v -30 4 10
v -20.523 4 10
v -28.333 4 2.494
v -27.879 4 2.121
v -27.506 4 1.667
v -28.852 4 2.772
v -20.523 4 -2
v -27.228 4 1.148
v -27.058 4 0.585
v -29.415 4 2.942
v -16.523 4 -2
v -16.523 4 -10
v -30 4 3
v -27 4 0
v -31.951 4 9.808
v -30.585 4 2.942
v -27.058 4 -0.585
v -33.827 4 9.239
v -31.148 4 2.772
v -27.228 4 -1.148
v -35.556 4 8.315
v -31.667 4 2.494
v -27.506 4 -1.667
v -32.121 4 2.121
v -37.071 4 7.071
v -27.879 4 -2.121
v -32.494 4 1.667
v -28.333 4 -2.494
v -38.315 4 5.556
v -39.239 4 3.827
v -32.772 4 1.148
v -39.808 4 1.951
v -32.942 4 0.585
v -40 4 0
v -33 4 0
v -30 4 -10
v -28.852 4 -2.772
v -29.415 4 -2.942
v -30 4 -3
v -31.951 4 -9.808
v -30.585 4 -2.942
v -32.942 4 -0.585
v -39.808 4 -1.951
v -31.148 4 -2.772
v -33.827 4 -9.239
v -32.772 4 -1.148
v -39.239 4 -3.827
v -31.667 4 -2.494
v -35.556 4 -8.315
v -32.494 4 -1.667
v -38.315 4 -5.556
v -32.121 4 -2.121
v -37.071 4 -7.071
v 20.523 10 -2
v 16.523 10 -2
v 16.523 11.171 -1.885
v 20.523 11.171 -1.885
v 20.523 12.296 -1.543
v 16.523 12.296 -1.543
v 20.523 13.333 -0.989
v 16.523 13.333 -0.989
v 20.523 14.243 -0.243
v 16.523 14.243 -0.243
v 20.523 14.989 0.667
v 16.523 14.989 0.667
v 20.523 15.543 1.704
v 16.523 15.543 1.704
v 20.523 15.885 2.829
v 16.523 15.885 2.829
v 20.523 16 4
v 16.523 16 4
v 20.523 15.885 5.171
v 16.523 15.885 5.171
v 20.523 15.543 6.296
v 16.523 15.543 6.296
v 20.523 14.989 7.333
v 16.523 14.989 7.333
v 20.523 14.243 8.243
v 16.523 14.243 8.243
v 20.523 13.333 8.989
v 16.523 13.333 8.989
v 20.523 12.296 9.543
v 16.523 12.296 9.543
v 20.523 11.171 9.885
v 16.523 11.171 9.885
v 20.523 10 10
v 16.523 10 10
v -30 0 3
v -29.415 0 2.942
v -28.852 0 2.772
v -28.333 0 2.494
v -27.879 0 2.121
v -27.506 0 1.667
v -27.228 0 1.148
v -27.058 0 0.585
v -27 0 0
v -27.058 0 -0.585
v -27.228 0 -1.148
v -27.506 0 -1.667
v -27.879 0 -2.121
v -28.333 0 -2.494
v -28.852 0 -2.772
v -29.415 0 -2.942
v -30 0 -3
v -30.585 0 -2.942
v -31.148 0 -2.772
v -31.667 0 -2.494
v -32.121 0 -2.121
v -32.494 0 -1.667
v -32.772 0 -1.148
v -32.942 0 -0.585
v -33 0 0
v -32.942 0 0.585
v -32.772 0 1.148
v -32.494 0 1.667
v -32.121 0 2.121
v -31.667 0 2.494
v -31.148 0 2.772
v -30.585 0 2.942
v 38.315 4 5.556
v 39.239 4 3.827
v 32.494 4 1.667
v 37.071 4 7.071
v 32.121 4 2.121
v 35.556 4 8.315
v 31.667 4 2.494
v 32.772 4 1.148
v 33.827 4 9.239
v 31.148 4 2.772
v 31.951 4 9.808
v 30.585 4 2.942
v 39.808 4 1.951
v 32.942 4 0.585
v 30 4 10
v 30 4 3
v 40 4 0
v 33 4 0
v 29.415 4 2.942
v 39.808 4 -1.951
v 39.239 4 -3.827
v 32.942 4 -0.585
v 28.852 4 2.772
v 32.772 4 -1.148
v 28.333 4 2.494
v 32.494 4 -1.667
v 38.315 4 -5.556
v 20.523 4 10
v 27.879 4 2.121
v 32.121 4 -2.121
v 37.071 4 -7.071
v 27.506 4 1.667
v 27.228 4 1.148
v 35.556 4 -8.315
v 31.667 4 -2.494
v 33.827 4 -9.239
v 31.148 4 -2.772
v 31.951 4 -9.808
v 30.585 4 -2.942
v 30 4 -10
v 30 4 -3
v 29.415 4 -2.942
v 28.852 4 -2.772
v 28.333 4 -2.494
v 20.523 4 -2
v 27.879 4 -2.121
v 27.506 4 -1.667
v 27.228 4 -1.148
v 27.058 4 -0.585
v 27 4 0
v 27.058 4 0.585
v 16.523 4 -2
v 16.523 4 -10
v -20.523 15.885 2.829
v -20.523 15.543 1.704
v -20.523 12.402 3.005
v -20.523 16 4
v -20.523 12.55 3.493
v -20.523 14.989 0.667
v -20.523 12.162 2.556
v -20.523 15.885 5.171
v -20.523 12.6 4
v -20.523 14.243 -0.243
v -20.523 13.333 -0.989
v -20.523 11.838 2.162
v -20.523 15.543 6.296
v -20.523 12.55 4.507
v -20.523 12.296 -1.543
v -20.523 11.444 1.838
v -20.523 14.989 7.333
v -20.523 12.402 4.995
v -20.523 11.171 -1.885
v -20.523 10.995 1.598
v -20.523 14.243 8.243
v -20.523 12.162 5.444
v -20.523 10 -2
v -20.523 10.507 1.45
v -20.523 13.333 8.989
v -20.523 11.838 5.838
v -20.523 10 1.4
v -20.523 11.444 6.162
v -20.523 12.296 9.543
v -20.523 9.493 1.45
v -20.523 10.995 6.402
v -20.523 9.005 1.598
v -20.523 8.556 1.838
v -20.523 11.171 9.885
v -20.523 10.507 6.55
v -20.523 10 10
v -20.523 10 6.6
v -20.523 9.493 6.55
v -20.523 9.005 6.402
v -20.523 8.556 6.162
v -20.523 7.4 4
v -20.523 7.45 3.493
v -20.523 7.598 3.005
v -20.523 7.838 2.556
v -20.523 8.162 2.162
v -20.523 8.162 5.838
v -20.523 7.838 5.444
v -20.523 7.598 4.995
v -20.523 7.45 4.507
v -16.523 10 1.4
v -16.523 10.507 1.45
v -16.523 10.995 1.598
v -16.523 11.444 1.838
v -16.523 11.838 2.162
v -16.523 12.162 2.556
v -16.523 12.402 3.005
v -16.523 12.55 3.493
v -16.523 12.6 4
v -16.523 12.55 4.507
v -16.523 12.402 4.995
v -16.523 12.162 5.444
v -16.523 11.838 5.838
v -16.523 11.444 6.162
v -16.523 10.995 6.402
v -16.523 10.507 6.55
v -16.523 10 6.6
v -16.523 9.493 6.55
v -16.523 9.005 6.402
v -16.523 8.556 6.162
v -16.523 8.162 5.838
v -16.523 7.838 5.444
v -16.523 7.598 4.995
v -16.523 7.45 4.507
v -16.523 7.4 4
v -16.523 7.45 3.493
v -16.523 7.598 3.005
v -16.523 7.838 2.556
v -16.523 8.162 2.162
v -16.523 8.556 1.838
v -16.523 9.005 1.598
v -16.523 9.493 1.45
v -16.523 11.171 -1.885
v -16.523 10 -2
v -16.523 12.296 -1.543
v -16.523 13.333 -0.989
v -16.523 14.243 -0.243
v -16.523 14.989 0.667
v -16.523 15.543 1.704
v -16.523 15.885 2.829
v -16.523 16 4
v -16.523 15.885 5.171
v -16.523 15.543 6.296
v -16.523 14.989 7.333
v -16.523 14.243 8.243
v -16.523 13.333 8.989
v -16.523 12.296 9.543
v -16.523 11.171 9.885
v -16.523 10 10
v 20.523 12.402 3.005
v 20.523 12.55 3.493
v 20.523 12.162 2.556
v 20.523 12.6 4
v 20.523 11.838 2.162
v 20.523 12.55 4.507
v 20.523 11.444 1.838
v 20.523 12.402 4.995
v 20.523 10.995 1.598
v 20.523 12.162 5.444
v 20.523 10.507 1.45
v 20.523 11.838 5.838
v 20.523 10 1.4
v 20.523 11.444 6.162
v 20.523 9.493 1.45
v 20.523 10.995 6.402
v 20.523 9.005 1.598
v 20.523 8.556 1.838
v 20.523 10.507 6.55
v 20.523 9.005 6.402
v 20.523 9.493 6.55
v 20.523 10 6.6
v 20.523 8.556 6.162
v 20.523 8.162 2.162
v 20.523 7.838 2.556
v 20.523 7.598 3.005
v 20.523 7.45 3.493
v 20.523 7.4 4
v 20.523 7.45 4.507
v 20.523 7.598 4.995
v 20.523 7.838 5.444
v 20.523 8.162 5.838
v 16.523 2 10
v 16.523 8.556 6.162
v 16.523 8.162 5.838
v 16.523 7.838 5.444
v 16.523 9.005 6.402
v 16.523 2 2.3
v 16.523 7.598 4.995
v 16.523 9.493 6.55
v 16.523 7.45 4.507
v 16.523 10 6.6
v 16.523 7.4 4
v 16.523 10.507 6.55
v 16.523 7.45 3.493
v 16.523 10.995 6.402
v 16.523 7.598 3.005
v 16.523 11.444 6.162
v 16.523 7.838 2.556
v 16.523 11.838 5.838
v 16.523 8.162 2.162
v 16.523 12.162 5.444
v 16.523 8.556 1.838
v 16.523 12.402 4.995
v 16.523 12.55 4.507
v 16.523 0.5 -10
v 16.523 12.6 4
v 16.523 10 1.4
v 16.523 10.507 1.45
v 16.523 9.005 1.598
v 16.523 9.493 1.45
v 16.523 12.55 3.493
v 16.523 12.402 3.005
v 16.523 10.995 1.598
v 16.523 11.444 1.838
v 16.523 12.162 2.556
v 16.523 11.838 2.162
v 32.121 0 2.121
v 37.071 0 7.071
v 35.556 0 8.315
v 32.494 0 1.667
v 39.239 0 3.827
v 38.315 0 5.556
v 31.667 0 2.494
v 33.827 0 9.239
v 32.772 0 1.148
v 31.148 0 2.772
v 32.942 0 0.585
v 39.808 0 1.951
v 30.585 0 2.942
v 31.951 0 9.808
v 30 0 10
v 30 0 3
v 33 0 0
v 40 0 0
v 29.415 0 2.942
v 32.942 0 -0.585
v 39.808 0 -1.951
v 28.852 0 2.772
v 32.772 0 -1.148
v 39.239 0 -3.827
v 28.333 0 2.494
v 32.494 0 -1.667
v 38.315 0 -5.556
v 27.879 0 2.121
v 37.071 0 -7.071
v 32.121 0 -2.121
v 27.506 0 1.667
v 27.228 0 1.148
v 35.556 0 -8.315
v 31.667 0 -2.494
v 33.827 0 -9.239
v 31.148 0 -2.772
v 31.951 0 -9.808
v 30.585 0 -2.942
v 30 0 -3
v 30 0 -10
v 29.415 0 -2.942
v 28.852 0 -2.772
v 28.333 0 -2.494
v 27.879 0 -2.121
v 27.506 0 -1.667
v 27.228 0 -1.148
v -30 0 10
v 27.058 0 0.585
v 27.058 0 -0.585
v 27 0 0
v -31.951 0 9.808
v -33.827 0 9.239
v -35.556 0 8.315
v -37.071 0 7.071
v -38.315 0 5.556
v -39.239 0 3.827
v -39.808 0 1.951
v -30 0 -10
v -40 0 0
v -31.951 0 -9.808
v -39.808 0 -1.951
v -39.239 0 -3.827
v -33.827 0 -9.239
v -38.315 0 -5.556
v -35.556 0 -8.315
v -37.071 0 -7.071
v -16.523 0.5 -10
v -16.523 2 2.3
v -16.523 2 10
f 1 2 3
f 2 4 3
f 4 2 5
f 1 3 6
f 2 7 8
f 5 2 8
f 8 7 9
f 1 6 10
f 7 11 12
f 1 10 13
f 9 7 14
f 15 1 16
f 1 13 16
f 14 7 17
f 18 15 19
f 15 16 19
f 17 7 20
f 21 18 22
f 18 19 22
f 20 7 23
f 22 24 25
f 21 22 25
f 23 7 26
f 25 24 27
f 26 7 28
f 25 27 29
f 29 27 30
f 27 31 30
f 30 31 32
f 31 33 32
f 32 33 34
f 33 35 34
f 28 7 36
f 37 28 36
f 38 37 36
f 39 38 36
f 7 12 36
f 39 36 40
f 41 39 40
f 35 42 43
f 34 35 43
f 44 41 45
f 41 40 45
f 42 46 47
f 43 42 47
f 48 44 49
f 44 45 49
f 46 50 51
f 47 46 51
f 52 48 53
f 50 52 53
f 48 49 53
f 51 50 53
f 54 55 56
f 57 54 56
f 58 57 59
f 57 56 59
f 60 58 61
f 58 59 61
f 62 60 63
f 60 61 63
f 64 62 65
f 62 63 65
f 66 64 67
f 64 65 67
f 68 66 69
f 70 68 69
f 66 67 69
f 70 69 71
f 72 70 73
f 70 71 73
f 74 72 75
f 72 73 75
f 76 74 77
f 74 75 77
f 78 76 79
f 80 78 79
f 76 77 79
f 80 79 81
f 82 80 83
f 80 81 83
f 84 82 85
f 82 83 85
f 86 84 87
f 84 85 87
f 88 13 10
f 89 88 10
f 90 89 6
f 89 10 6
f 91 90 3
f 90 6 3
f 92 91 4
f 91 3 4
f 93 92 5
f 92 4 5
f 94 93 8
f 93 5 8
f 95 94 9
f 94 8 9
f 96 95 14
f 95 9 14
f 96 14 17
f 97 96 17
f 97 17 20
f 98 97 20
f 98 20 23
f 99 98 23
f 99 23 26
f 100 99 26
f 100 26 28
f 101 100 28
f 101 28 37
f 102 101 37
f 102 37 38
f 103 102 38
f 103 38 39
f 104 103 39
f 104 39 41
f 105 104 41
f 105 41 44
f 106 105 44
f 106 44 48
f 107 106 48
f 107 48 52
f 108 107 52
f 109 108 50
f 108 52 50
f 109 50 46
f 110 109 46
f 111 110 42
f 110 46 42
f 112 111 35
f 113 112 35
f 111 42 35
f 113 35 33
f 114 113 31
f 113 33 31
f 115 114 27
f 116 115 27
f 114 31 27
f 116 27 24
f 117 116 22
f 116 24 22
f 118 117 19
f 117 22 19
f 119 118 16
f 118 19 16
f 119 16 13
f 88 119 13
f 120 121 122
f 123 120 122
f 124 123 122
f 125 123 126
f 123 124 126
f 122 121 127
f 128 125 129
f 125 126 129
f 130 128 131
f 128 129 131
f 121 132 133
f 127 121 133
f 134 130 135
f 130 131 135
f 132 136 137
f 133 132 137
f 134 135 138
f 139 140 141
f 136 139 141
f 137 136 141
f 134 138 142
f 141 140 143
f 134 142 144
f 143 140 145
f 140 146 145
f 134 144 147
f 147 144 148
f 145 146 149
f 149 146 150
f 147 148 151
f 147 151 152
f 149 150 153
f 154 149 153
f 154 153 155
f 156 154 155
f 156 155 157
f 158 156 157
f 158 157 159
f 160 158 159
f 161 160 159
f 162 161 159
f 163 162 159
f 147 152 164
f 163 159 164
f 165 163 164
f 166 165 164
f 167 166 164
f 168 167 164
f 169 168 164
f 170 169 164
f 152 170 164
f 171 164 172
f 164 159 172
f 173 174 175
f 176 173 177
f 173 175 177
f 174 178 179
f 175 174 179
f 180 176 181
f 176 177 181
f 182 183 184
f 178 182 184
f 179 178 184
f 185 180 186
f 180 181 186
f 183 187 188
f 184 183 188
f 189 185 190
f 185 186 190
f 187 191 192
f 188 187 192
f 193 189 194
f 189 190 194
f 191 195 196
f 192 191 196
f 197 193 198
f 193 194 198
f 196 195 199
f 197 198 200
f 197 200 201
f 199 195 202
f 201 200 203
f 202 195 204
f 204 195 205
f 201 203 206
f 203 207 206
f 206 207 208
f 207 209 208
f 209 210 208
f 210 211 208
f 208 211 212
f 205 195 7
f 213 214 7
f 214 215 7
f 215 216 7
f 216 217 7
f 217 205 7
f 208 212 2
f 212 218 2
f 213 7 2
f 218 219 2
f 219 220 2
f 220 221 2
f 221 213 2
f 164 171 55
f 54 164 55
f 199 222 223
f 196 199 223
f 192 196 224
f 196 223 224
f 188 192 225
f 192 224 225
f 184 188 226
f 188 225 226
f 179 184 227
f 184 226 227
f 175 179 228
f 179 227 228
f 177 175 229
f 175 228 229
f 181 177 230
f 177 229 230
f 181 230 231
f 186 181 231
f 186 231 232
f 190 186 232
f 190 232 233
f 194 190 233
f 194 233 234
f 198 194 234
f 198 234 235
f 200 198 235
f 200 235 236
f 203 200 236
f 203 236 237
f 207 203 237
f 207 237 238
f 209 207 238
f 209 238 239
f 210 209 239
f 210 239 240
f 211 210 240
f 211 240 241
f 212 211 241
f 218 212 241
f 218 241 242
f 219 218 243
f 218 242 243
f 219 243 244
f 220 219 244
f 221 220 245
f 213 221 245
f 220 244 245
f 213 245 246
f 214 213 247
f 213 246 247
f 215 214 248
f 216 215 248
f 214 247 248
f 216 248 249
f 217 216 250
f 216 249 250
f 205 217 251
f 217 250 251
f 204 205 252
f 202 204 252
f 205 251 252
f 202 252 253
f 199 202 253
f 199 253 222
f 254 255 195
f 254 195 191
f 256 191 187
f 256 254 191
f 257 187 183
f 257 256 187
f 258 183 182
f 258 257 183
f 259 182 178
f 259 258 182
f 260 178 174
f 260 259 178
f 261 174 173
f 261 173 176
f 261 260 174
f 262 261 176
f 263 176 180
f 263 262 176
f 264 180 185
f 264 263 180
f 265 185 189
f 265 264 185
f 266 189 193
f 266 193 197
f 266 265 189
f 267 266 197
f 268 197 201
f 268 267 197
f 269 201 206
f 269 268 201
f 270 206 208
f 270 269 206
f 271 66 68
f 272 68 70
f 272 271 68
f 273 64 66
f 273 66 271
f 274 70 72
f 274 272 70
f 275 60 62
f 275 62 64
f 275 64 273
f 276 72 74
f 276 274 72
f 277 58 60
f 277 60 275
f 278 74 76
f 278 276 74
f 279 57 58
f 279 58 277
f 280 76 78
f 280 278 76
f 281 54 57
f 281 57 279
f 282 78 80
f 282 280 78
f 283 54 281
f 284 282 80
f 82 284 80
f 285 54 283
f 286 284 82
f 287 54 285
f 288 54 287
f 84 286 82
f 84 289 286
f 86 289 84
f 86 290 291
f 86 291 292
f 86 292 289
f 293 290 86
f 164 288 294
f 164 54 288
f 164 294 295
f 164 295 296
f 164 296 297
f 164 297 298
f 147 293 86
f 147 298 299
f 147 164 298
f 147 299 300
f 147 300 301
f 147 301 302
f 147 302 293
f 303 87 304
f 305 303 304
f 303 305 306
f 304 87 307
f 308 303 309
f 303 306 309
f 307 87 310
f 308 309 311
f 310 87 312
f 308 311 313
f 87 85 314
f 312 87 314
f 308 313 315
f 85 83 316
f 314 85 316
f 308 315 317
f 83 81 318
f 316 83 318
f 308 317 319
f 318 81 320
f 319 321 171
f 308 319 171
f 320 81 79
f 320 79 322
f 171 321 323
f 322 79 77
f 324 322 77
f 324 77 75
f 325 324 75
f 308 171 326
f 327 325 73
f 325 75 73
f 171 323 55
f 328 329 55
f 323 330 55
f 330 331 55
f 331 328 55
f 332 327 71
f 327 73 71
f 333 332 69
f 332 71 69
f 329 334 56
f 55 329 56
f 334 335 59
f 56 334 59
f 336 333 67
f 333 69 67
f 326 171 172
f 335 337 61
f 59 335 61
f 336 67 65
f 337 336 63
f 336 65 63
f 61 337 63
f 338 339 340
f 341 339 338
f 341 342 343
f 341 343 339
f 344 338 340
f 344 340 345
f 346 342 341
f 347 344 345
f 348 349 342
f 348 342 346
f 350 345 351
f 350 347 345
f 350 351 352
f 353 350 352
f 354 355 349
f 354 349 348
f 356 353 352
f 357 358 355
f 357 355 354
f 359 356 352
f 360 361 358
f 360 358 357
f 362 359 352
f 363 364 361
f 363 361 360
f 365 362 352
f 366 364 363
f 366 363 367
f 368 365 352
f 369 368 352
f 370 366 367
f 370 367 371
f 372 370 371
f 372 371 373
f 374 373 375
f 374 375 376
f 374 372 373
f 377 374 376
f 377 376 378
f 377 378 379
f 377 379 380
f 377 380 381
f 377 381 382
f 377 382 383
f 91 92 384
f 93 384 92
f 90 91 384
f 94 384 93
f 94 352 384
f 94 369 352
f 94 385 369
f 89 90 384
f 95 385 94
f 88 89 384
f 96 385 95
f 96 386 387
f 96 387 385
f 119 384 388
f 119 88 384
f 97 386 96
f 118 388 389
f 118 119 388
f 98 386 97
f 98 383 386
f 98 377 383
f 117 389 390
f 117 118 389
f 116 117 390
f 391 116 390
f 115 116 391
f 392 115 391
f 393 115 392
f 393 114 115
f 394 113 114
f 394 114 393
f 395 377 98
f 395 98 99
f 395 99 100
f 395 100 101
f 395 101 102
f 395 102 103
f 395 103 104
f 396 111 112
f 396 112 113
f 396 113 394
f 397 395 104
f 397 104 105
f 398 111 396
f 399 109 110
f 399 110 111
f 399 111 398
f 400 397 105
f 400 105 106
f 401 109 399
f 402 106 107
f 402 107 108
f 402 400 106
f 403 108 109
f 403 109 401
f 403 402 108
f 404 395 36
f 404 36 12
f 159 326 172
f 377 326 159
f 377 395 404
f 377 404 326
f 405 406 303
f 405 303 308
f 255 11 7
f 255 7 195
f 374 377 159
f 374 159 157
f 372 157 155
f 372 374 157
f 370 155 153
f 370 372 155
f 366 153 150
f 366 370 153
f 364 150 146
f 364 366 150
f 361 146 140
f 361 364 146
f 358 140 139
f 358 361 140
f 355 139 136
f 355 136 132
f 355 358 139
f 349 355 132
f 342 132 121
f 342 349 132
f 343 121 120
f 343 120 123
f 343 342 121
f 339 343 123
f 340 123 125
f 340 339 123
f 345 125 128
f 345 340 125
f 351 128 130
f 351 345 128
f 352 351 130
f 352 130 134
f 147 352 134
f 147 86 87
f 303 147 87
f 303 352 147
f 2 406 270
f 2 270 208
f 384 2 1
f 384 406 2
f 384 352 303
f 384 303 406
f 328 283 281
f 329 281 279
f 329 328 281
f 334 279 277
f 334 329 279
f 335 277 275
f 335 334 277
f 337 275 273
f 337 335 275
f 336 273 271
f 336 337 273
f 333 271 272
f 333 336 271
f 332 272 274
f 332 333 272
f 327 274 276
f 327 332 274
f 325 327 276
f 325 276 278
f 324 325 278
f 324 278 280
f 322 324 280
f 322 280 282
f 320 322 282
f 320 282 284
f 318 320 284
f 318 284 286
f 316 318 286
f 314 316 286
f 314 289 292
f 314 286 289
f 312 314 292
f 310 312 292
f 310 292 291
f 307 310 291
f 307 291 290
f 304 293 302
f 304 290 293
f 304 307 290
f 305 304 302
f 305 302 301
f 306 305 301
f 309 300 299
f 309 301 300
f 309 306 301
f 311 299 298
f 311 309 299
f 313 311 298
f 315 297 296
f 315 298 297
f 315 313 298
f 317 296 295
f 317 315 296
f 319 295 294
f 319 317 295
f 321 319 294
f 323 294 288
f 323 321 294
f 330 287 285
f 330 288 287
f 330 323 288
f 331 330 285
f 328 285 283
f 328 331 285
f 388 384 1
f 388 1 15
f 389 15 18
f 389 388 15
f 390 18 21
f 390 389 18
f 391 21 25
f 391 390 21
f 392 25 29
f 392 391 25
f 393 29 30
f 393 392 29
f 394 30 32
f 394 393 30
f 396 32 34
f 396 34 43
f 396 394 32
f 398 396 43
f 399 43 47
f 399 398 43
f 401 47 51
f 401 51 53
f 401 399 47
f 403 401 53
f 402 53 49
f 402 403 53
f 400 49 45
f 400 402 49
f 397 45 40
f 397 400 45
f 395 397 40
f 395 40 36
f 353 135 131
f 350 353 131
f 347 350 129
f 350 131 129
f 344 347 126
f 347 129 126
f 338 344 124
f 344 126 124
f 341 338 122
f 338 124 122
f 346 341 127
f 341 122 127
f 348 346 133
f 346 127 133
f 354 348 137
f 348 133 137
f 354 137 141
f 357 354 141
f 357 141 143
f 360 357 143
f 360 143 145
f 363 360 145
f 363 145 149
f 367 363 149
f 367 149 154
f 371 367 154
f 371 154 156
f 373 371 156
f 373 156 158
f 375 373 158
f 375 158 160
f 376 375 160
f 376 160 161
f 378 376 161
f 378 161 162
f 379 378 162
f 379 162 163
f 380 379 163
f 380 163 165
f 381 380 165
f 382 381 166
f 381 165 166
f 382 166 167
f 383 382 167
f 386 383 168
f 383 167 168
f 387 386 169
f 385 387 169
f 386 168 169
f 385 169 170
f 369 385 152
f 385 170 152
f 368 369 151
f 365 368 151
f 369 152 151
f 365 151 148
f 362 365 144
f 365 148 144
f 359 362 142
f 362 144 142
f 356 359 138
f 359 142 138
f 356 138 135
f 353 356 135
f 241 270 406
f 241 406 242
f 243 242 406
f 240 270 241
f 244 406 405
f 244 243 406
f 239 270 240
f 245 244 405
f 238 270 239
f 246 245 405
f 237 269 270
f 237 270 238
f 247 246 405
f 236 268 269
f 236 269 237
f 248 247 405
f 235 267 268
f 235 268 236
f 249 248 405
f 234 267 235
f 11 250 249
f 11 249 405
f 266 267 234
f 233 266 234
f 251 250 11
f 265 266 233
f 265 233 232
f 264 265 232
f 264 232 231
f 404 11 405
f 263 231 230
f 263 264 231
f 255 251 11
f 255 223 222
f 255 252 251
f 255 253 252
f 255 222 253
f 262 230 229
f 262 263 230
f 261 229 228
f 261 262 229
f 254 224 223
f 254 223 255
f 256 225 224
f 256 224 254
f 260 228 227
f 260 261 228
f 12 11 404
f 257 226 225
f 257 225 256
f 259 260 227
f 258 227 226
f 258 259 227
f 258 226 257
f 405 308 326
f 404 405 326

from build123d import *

# Parameters (mm, degrees)
BOSS_EXTRUDE1_DEPTH = 4
SKETCH2_R           = 3
CUT_EXTRUDE1_DEPTH  = 42.424630354
BOSS_EXTRUDE2_DEPTH = 4
SKETCH3_R           = 2.6
CUT_EXTRUDE2_DEPTH  = 60.58873158
SKETCH4_OUTSIDE_W   = 38.8
SKETCH4_OUTSIDE_H   = 34.8
CUT_EXTRUDE3_DEPTH  = 16.522711642


with BuildPart() as part:
    # Sketch1 → Boss-Extrude1 (new body)
    with BuildSketch(Plane(origin=(0, 0, 0), x_dir=(1, 0, 0), z_dir=(0, 1, 0))):
        with BuildLine():
            Line((-30, 10), (30, 10))
            ThreePointArc((30, 10), (40, 0), (30, -10))
            Line((30, -10), (-30, -10))
            ThreePointArc((-30, -10), (-40, 0), (-30, 10))
        make_face()
    extrude(amount=BOSS_EXTRUDE1_DEPTH)

    # Sketch2 → Cut-Extrude1 (cut, through all)
    with BuildSketch(Plane(origin=(0, 4, 0), x_dir=(1, 0, 0), z_dir=(0, 1, 0))):
        with Locations(Location((-30, 0, 0), (0, 0, 270))):
            Circle(SKETCH2_R)
        with Locations(Location((30, 0, 0), (0, 0, 270))):
            Circle(SKETCH2_R)
    extrude(amount=-CUT_EXTRUDE1_DEPTH, mode=Mode.SUBTRACT)

    # 3DSketch1 → Boss-Extrude2 (add)
    with BuildSketch(Plane(origin=(-16.522711642, 4, 10), x_dir=(0, 0.447213595499958, -0.894427190999916), z_dir=(-1, 0, 0))):
        with BuildLine():
            Line((0, 0), (10.733126292, 5.366563146))
            Line((10.733126292, 5.366563146), (13.416407865, 0))
            ThreePointArc((13.416407865, 0), (10.733126292, -8.049844719), (2.683281573, -5.366563146))
            Line((2.683281573, -5.366563146), (0, 0))
        make_face()
    boss_extrude2 = extrude(amount=BOSS_EXTRUDE2_DEPTH)

    # Sketch3 → Cut-Extrude2 (cut, through all)
    with BuildSketch(Plane(origin=(-16.522711642, 0, 0), x_dir=(0, 0, -1), z_dir=(1, 0, 0))):
        with Locations((-4, 10)):
            Circle(SKETCH3_R)
    cut_extrude2 = extrude(amount=-CUT_EXTRUDE2_DEPTH, mode=Mode.SUBTRACT)

    # Sketch4 outside → Cut-Extrude3 (cut)
    with BuildSketch(Plane(origin=(0, 0, 0), x_dir=(0, 0, -1), z_dir=(1, 0, 0))):
        with Locations((0, 8)):
            Rectangle(SKETCH4_OUTSIDE_W, SKETCH4_OUTSIDE_H)
        Polygon((-10, 2), (-2.3, 2), (10, 0.5), (10, 0), (-10, 0), align=None, mode=Mode.SUBTRACT)
    cut_extrude3 = extrude(amount=-CUT_EXTRUDE3_DEPTH, mode=Mode.SUBTRACT)

    # Mirror1: Boss-Extrude2, Cut-Extrude2, Cut-Extrude3 across plane
    add(boss_extrude2.mirror(Plane(origin=(0, 0, 0), x_dir=(0, 0, 1), z_dir=(1, 0, 0))))
    add(cut_extrude2.mirror(Plane(origin=(0, 0, 0), x_dir=(0, 0, 1), z_dir=(1, 0, 0))), mode=Mode.SUBTRACT)
    add(cut_extrude3.mirror(Plane(origin=(0, 0, 0), x_dir=(0, 0, 1), z_dir=(1, 0, 0))), mode=Mode.SUBTRACT)


solid = part.part
